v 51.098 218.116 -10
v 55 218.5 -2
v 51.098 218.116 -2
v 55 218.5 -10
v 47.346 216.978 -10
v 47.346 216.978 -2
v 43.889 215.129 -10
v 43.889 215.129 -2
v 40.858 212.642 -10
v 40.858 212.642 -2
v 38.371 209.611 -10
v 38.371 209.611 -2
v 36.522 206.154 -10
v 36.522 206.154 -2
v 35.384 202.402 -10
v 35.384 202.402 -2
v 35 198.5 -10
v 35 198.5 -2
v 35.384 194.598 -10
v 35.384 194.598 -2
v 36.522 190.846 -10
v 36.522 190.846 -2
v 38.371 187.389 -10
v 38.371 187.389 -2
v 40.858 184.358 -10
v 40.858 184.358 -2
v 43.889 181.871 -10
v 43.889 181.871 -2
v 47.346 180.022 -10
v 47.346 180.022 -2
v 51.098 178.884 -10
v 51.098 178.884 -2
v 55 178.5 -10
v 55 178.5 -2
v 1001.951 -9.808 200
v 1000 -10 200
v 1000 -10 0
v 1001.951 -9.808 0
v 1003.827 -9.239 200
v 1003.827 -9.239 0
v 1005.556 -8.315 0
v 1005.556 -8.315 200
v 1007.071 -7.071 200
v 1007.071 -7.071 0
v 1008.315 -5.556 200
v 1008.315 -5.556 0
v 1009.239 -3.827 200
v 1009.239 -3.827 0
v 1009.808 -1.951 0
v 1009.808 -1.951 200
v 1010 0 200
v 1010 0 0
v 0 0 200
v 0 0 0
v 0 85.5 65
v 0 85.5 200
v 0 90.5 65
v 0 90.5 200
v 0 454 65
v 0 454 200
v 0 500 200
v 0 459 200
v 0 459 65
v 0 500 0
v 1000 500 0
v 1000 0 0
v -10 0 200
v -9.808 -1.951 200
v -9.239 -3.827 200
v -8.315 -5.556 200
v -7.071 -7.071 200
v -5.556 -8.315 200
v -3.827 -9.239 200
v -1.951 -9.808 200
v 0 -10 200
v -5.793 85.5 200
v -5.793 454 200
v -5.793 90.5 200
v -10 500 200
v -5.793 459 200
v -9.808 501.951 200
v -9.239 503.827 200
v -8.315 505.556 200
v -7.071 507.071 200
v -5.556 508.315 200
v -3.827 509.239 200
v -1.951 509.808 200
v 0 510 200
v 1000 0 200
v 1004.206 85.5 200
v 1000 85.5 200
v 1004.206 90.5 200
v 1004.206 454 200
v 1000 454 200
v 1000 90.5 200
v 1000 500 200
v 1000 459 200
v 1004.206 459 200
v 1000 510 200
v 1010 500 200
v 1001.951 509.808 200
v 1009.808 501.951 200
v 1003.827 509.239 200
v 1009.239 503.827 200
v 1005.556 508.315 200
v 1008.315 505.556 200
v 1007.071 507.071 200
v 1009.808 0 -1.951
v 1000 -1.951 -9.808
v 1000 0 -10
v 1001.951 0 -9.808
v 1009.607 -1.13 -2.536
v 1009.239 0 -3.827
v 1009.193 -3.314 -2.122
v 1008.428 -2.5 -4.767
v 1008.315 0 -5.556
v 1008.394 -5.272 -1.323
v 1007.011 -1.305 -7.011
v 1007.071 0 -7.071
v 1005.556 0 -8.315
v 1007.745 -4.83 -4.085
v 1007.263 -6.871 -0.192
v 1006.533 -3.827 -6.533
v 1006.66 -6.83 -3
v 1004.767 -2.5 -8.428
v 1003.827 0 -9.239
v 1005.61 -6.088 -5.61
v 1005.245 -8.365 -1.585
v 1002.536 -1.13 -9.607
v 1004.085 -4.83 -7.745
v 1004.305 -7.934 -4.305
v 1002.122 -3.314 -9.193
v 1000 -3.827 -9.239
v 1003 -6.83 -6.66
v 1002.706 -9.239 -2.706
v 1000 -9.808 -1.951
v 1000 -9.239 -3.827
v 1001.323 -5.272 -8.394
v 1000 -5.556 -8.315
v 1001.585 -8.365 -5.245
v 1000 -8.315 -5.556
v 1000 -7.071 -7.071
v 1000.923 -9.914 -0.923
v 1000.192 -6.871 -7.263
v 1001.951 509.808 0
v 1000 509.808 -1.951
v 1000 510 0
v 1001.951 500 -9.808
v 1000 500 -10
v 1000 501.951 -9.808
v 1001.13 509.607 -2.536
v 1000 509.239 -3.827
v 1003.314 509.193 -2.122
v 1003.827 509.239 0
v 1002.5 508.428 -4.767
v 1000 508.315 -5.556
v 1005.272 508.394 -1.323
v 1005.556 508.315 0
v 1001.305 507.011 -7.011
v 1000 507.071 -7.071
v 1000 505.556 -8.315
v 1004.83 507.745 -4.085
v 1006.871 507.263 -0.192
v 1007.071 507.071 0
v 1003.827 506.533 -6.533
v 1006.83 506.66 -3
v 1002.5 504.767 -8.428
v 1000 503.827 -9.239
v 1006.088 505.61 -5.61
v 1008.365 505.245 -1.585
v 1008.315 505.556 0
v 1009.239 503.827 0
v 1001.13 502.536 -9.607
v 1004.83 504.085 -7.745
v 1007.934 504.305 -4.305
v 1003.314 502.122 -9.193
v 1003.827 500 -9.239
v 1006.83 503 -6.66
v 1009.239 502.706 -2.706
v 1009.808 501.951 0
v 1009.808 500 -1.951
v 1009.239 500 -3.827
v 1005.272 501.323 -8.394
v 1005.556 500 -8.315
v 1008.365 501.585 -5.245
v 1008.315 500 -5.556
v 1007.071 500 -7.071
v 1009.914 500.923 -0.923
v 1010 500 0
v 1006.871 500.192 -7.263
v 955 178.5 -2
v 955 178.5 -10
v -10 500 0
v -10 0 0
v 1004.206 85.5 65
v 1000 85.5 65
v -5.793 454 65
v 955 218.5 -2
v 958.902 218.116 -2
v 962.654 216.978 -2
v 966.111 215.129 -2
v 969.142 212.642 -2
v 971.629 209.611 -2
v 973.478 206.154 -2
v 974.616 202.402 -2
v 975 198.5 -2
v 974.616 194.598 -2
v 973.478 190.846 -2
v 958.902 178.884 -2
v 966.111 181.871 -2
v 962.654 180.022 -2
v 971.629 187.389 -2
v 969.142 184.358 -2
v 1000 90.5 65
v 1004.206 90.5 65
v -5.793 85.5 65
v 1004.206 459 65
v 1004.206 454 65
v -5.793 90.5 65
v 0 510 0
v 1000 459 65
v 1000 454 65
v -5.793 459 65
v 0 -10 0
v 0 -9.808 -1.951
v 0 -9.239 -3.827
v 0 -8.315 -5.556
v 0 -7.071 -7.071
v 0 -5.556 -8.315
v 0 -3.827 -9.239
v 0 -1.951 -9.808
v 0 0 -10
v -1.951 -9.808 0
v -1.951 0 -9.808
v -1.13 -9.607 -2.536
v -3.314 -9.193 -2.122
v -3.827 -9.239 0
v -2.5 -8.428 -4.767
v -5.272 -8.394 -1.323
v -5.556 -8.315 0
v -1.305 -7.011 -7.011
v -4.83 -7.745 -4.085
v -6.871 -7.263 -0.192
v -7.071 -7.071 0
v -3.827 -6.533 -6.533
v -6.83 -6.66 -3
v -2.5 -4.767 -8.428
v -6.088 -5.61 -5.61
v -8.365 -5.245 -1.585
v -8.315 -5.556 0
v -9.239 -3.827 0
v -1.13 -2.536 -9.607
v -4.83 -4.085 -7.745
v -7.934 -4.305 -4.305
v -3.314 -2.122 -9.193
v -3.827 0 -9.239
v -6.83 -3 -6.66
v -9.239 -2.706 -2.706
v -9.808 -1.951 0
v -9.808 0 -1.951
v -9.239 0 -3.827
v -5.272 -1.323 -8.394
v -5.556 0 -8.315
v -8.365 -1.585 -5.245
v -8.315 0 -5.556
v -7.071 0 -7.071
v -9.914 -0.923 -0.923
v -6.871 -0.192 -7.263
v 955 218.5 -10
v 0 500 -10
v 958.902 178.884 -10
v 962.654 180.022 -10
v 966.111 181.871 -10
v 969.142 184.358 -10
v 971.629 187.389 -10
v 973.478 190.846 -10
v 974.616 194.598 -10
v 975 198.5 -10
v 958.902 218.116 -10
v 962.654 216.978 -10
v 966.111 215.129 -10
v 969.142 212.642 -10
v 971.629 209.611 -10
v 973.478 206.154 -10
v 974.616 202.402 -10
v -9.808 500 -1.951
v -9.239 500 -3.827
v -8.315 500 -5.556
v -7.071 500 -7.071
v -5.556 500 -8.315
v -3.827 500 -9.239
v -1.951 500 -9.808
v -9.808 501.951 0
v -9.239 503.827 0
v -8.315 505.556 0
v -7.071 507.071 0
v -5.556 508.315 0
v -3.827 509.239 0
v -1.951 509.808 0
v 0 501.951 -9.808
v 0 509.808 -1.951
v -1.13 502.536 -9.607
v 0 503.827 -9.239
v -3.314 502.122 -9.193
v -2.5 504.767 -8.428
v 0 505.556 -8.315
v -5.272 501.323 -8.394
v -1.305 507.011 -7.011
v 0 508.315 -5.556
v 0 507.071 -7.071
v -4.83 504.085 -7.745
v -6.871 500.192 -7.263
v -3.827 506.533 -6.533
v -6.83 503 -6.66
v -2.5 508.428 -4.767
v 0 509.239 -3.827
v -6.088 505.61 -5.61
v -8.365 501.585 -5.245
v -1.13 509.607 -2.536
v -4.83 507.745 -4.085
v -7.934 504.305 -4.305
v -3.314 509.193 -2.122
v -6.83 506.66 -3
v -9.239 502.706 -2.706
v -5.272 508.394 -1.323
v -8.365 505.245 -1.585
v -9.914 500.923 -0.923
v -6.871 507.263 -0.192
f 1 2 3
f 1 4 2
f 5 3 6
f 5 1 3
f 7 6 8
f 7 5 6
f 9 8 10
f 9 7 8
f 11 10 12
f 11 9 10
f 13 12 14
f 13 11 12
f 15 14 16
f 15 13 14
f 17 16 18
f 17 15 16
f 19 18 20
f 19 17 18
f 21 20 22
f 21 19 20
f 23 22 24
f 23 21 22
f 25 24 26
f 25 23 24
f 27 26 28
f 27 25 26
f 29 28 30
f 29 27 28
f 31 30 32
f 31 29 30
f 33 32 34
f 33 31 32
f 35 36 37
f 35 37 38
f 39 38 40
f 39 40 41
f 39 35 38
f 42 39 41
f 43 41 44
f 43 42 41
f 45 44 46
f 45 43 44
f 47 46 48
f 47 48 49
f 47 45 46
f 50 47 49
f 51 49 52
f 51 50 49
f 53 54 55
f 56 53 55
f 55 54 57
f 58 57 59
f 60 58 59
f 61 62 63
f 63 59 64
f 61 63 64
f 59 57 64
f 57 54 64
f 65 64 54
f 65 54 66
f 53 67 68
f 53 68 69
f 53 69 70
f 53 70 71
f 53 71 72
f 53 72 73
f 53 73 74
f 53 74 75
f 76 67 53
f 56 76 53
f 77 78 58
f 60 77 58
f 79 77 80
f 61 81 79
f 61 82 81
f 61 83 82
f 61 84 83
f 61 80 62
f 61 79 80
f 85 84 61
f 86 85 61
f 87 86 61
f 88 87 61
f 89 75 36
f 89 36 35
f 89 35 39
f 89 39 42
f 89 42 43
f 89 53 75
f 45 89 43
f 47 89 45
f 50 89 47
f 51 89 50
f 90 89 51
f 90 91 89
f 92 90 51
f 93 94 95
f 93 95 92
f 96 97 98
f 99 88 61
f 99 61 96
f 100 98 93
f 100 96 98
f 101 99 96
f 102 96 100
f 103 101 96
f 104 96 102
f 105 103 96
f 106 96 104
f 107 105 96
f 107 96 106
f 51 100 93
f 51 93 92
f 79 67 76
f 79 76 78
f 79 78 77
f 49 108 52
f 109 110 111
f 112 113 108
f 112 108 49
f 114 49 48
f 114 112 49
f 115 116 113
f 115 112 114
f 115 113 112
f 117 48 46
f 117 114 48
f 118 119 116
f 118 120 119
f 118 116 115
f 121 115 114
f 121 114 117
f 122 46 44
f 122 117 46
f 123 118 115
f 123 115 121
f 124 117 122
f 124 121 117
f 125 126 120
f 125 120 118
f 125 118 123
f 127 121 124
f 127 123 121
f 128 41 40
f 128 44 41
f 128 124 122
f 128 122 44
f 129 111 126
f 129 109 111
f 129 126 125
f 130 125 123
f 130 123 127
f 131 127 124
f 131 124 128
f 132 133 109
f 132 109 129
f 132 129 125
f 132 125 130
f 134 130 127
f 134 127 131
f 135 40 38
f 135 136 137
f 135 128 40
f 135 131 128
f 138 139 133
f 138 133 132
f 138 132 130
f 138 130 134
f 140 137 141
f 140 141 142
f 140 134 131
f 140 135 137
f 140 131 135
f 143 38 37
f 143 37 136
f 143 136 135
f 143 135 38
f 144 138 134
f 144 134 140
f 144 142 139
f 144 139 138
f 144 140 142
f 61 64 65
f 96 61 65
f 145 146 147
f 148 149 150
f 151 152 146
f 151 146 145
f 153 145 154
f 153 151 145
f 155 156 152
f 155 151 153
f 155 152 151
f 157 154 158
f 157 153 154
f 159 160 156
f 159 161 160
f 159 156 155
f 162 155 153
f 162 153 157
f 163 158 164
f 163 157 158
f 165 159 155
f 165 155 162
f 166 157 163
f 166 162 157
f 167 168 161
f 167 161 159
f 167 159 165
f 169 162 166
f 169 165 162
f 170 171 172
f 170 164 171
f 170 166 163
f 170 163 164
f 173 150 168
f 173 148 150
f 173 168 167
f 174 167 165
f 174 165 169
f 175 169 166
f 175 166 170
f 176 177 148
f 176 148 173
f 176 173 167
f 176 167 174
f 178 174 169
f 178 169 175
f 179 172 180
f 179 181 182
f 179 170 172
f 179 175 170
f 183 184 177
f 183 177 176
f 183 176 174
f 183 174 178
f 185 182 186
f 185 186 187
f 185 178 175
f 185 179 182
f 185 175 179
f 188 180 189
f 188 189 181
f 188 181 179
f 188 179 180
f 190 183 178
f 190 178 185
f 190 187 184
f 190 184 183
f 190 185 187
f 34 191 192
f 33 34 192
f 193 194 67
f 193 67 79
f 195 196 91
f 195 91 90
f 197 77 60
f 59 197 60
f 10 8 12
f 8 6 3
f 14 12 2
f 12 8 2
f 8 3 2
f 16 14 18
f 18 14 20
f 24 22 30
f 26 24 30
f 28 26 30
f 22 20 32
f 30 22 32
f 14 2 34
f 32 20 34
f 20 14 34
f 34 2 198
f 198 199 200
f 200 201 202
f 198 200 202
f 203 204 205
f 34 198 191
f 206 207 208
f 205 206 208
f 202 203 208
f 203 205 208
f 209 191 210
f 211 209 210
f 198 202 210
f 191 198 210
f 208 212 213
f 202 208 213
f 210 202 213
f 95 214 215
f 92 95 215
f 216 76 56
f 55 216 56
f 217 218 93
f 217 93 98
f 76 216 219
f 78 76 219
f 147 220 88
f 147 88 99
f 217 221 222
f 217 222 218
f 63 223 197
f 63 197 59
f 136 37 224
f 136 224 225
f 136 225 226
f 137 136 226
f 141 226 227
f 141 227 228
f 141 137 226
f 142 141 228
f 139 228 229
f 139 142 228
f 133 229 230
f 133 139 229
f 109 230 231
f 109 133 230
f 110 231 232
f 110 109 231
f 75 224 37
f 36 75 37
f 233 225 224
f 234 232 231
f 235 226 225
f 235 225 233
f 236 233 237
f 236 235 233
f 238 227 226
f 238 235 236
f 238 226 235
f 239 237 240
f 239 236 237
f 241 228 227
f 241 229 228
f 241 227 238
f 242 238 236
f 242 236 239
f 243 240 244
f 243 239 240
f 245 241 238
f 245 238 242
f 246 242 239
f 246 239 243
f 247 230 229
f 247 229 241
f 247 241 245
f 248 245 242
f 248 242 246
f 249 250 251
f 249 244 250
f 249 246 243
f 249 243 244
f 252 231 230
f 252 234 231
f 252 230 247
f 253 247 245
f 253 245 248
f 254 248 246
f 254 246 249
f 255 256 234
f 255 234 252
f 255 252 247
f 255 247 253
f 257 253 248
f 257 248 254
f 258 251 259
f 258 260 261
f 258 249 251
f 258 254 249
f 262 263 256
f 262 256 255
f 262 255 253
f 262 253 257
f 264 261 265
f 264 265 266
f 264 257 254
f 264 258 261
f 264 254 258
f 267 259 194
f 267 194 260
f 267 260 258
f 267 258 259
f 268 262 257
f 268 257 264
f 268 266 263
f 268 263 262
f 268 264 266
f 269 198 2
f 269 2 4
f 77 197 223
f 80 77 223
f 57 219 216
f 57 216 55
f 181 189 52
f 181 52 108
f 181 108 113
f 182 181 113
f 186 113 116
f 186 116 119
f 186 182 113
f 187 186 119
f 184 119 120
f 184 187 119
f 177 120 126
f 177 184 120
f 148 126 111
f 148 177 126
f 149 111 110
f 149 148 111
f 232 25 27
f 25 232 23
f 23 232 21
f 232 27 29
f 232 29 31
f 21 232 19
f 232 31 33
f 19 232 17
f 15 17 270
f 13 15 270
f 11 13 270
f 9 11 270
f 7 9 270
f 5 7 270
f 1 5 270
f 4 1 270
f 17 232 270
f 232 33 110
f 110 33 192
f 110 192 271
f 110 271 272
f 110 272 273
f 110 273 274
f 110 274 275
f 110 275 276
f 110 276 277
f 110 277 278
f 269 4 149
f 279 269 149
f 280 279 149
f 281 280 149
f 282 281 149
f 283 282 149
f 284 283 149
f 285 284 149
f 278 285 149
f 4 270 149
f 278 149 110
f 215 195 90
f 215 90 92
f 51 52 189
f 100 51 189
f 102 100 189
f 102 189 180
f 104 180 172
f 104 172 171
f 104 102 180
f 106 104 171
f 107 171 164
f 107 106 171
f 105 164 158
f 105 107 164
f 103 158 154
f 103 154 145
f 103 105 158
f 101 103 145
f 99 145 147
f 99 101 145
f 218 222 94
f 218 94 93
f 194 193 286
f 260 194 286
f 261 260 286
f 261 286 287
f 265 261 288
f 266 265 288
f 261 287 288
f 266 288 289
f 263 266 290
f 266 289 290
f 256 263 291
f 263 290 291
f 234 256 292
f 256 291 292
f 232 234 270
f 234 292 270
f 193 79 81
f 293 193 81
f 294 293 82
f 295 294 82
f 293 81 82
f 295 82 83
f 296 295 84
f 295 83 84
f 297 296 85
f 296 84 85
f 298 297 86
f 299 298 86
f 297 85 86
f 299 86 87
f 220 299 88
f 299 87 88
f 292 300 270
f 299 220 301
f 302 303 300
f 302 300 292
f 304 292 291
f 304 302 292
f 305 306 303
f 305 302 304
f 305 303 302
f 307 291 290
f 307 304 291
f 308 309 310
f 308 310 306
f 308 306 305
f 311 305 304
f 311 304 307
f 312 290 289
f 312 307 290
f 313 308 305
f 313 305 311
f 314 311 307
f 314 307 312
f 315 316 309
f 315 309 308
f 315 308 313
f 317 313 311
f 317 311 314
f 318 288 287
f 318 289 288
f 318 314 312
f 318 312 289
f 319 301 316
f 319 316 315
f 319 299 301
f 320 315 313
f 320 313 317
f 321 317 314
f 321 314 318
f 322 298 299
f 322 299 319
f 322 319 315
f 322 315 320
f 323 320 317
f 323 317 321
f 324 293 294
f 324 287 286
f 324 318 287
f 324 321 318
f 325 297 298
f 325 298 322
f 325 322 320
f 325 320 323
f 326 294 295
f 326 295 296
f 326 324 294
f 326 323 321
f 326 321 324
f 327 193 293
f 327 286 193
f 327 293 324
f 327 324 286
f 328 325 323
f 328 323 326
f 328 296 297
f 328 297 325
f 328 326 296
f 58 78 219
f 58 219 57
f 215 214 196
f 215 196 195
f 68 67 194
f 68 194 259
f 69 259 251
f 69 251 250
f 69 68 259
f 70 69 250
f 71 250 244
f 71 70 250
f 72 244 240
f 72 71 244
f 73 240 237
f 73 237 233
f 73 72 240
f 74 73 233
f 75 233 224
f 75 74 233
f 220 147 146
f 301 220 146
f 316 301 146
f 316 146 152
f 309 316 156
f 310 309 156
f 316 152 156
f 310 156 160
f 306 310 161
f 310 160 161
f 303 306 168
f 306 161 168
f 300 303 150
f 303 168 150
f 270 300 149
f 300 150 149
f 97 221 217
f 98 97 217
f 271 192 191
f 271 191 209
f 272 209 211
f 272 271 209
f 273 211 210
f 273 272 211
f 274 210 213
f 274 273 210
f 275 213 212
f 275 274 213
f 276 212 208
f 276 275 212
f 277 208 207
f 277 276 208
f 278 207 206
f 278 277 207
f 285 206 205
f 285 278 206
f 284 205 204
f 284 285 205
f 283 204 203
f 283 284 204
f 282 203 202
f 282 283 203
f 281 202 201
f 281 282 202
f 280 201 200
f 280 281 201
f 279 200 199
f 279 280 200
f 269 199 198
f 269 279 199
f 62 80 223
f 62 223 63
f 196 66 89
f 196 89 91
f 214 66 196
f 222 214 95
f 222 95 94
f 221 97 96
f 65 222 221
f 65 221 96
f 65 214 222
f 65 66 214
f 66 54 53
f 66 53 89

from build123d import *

# Parameters (mm, degrees)
BOX012_W               = 9.5
BOX012_H               = 900
BOX012_DEPTH           = 40
CYLINDER004_R          = 20
CYLINDER004_DEPTH      = 9.5
CYLINDER003_R          = 20
CYLINDER003_DEPTH      = 9.5
FUSION_PITCH_ANGLE     = 90
FUSION_PLACEMENT_ANGLE = -90
BOX011_W               = 1010
BOX011_H               = 5
BOX011_DEPTH           = 200
BOX010_W               = 1010
BOX010_H               = 5
BOX010_DEPTH           = 200
BOX_W                  = 1000
BOX_H                  = 500
BOX_DEPTH              = 200
THICKNESS_T            = 10


with BuildPart() as cube002:
    # Box012 → Box012 (new body)
    with BuildSketch(Plane(origin=(-8, 55, 119), x_dir=(1, 0, 0), z_dir=(0, 0, 1))):
        with Locations((4.75, 450)):
            Rectangle(BOX012_W, BOX012_H)
    extrude(amount=BOX012_DEPTH)


with BuildPart() as cylinder004:
    # Cylinder004 → Cylinder004 (new body)
    with BuildSketch(Plane(origin=(1.5, 955, 139), x_dir=(0, 0, 1), z_dir=(-1, 0, 0))):
        Circle(CYLINDER004_R)
    extrude(amount=CYLINDER004_DEPTH)


with BuildPart() as windows:
    # Cylinder003 → Cylinder003 (new body)
    with BuildSketch(Plane(origin=(1.5, 55, 139), x_dir=(0, 0, 1), z_dir=(-1, 0, 0))):
        Circle(CYLINDER003_R)
    extrude(amount=CYLINDER003_DEPTH)

    # Fusion: union Cube002, Cylinder004
    add(cube002.part)
    add(cylinder004.part)


with BuildPart() as windows_1:
    # Fusion pitch: moved
    add(windows.part.rotate(Axis((0, 0, 0), (0, 1, 0)), FUSION_PITCH_ANGLE))


with BuildPart() as windows_2:
    # Fusion placement: moved
    add(windows_1.part.moved(Location((0, 337.5, -10))).rotate(Axis((0, 337.5, -10), (0, 0, 1)), FUSION_PLACEMENT_ANGLE))


with BuildPart() as supportrail002:
    # Box011 → Box011 (new body)
    with BuildSketch(Plane(origin=(-5.7935, 85.5, 65), x_dir=(1, 0, 0), z_dir=(0, 0, 1))):
        with Locations((505, 2.5)):
            Rectangle(BOX011_W, BOX011_H)
    extrude(amount=BOX011_DEPTH)


with BuildPart() as supportrail001:
    # Box010 → Box010 (new body)
    with BuildSketch(Plane(origin=(-5.7935, 454, 65), x_dir=(1, 0, 0), z_dir=(0, 0, 1))):
        with Locations((505, 2.5)):
            Rectangle(BOX010_W, BOX010_H)
    extrude(amount=BOX010_DEPTH)


with BuildPart() as cherenkovbox:
    # Box → Box (new body)
    with BuildSketch(Plane.XY):
        with Locations((500, 250)):
            Rectangle(BOX_W, BOX_H)
    extrude(amount=BOX_DEPTH)

    # Thickness
    thickness_openings = [cherenkovbox.faces().sort_by_distance(p)[0] for p in [
        (500, 250, 200),
    ]]
    offset(amount=THICKNESS_T, openings=thickness_openings)

    # Cut: cut SupportRail001
    add(supportrail001.part, mode=Mode.SUBTRACT)

    # Cut001: cut SupportRail002
    add(supportrail002.part, mode=Mode.SUBTRACT)

    # Cut002: cut Windows
    add(windows_2.part, mode=Mode.SUBTRACT)


solid = cherenkovbox.part
